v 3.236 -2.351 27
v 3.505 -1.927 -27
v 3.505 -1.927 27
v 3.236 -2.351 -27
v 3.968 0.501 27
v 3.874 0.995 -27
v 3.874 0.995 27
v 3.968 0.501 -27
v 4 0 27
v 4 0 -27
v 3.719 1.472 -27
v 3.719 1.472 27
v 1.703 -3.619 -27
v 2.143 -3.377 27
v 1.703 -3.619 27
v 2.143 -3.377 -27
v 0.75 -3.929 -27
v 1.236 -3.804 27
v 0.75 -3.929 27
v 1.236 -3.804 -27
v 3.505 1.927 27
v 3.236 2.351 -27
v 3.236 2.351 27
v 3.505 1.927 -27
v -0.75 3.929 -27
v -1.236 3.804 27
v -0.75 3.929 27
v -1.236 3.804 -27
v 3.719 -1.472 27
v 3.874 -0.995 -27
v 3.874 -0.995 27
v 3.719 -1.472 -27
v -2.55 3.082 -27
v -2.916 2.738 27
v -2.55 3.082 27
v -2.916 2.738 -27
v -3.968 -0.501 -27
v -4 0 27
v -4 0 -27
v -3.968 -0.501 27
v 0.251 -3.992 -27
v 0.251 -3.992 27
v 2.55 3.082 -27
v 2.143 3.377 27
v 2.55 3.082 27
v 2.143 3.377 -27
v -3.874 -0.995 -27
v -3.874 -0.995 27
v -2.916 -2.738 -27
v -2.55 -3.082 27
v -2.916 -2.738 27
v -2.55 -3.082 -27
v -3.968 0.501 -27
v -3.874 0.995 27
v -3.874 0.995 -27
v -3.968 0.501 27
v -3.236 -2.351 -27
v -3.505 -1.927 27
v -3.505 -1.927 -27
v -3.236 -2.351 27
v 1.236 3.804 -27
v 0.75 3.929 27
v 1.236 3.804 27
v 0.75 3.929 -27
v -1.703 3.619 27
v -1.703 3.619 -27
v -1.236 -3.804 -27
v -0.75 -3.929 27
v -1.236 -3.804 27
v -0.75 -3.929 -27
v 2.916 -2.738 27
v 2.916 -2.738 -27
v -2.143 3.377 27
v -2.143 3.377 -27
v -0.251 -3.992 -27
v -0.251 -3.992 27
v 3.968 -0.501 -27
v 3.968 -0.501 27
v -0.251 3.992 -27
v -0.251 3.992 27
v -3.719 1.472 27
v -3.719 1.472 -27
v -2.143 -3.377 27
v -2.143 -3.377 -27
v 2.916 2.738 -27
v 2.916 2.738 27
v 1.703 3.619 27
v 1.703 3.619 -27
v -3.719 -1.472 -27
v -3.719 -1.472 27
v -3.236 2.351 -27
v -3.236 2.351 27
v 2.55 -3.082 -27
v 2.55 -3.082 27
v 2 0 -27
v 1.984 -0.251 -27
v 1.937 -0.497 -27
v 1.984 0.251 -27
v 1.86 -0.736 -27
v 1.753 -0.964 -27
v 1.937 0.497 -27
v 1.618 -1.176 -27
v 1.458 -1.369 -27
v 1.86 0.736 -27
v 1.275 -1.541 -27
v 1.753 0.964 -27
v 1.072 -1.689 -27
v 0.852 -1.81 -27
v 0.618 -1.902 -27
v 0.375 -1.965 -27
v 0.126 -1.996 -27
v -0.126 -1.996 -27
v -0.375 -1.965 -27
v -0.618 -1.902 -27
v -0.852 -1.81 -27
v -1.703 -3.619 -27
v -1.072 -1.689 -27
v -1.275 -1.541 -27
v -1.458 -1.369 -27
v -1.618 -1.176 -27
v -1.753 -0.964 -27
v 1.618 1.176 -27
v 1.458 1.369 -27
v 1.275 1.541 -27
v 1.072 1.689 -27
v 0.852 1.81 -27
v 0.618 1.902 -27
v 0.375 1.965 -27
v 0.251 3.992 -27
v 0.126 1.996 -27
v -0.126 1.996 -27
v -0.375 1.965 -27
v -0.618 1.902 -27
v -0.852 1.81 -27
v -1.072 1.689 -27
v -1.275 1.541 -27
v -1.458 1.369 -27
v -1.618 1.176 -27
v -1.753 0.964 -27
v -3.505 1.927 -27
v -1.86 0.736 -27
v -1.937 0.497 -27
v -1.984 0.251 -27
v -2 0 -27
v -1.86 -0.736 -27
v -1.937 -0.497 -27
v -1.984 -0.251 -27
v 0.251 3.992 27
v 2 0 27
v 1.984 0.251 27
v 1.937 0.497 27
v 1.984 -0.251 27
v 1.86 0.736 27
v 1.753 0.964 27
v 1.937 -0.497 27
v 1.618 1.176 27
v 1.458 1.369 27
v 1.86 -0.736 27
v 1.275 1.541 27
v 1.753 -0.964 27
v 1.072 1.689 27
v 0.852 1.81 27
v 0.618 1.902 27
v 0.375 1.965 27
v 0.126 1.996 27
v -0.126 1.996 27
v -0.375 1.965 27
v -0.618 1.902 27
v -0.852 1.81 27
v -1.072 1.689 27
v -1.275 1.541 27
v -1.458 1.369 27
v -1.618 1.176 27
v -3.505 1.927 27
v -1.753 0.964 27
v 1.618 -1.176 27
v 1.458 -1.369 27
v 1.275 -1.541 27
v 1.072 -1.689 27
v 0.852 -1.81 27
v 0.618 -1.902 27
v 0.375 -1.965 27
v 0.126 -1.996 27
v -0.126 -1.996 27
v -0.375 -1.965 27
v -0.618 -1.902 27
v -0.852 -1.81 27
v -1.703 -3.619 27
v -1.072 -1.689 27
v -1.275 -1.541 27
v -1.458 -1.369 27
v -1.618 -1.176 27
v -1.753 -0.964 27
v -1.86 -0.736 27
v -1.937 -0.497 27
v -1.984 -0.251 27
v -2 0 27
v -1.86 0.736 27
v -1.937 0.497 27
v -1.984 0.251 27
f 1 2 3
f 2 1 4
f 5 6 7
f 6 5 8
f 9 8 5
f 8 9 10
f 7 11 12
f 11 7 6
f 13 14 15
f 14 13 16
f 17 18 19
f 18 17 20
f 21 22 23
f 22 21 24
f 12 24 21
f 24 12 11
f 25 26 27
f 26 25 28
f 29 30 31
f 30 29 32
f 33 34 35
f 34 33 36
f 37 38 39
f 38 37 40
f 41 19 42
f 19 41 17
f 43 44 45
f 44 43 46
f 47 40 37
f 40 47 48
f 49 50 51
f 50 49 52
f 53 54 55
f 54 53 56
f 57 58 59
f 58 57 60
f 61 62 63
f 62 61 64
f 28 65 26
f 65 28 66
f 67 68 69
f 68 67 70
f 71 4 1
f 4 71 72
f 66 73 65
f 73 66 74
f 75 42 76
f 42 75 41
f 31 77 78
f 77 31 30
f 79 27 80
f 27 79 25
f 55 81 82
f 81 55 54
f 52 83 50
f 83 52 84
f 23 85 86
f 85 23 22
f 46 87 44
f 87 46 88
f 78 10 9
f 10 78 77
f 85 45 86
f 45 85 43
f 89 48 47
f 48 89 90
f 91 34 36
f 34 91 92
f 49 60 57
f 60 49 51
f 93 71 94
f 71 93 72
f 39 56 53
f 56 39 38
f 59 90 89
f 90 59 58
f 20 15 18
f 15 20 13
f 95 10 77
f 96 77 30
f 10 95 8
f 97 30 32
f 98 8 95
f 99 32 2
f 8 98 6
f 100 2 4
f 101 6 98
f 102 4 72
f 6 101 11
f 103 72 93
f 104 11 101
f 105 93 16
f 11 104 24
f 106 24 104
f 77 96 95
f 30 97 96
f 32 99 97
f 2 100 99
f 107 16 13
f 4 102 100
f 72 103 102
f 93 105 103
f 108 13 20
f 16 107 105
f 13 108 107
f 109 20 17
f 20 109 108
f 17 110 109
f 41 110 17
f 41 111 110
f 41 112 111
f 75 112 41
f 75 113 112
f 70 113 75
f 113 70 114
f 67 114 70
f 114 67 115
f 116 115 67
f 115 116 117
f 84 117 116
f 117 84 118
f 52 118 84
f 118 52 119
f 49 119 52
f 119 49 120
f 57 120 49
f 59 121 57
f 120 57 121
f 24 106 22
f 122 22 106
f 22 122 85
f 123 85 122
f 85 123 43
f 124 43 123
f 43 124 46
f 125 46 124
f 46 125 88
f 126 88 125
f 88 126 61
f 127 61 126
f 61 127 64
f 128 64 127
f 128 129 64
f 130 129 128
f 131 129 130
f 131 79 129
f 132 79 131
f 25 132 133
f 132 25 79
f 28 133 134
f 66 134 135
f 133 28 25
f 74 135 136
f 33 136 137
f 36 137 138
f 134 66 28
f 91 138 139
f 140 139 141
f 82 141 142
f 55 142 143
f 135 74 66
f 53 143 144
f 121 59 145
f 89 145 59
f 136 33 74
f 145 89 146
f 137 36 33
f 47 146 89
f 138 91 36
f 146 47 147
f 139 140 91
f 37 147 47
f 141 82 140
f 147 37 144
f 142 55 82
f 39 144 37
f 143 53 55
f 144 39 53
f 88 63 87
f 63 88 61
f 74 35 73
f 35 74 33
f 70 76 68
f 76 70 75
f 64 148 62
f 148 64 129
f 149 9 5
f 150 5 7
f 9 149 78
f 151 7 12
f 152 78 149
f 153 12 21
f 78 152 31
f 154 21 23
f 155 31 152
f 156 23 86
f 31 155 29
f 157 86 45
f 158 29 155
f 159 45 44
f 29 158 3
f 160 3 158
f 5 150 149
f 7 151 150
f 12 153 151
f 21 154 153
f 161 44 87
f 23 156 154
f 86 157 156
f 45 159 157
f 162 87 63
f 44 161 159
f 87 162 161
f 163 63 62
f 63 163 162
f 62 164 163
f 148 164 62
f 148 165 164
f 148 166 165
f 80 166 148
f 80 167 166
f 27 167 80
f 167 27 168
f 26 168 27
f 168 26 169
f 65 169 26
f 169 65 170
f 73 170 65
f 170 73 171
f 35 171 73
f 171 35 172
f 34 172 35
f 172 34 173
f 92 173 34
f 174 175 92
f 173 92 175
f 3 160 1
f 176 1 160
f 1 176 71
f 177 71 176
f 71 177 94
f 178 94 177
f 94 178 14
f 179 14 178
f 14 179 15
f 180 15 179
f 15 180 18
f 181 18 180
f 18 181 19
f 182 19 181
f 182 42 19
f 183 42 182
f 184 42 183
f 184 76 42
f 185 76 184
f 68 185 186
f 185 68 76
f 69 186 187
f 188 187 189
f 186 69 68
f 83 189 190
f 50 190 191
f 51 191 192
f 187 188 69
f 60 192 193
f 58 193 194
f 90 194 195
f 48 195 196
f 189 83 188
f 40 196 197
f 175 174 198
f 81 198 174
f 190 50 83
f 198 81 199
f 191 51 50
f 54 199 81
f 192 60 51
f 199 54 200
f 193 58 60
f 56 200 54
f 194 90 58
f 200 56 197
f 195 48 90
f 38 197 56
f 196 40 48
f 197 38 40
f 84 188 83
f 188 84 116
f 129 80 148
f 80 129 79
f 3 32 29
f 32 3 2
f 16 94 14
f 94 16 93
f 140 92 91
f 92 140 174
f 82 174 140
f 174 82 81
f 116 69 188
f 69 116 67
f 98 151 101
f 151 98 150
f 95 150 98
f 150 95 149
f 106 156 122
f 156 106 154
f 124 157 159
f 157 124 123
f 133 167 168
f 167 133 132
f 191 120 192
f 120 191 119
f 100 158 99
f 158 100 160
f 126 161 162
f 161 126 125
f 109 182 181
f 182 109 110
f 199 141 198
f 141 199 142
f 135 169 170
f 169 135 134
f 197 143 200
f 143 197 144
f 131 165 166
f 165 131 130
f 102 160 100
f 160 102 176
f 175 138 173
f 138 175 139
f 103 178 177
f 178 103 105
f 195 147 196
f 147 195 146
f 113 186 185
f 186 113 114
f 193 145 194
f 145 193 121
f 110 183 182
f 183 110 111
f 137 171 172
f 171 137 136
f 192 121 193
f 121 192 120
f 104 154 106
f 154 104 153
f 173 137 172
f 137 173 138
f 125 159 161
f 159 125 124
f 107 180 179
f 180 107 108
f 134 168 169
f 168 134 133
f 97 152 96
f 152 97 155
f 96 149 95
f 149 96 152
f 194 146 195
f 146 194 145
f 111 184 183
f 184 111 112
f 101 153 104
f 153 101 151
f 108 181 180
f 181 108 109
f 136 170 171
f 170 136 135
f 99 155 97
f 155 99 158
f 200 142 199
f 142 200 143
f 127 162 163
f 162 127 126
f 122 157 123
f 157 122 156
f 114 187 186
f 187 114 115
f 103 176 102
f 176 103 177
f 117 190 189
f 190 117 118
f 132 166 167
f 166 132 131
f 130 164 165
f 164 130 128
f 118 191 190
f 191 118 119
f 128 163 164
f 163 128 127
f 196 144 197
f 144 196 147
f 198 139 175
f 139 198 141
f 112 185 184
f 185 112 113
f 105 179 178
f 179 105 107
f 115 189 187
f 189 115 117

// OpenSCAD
$fn = 50;


difference() {
	union() {
		translate(v = [0, 0, -27.0000000000]) {
			cylinder(h = 54, r = 4.0000000000);
		}
	}
	union() {
		translate(v = [0, 0, -100.0000000000]) {
			cylinder(h = 200, r = 2.0000000000);
		}
	}
}
